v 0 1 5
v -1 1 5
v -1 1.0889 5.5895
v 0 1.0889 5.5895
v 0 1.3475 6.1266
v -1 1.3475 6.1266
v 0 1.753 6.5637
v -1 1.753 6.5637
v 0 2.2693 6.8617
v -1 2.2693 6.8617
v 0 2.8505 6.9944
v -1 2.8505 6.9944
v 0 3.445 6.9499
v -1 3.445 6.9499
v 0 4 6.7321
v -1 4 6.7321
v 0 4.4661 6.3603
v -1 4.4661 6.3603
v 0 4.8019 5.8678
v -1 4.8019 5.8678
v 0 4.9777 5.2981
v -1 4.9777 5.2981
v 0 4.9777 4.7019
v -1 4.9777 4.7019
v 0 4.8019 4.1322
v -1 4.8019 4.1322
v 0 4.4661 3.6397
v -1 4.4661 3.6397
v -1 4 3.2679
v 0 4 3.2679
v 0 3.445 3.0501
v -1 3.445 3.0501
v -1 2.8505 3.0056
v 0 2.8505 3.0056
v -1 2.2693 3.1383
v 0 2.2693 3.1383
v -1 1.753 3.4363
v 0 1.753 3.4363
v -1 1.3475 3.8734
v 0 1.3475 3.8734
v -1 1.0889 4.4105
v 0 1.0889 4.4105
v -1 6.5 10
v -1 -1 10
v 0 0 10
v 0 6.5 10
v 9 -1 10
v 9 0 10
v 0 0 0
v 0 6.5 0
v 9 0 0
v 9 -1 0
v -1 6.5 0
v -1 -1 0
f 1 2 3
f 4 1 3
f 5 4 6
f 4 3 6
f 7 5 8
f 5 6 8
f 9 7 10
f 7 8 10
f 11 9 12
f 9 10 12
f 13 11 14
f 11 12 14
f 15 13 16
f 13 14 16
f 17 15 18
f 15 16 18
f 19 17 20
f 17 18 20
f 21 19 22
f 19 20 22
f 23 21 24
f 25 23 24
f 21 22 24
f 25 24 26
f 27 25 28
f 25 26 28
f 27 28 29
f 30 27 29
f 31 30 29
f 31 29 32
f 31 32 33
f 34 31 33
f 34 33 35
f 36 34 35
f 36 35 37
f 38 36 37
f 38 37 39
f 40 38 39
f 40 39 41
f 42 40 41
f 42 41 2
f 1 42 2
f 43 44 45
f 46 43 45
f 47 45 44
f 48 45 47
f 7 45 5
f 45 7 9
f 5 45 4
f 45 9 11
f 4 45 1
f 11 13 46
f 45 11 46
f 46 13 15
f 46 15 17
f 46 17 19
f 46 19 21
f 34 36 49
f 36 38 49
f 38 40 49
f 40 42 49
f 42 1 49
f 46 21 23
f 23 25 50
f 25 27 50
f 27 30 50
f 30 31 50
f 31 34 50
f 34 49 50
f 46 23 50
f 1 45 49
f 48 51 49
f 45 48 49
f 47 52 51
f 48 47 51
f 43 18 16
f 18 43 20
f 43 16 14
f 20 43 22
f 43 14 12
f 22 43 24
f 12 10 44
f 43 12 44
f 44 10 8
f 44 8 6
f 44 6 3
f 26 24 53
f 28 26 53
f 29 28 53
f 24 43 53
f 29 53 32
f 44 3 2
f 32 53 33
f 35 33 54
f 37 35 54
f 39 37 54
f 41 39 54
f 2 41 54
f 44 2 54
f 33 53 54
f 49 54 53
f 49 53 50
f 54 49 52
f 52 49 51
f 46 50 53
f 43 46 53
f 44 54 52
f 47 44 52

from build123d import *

# Parameters (mm, degrees)
AUFSATZ_LINEAR_AUSTRAGEN1_DEPTH = 10
SKIZZE2_R                       = 2
SCHNITT_LINEAR_AUSTRAGEN1_DEPTH = 16.564382416


with BuildPart() as part:
    # Skizze1 → Aufsatz-Linear austragen1 (new body)
    with BuildSketch(Plane.XY):
        Polygon((0, 0), (0, 6.5), (-1, 6.5), (-1, -1), (9, -1), (9, 0), align=None)
    extrude(amount=AUFSATZ_LINEAR_AUSTRAGEN1_DEPTH)

    # Skizze2 → Schnitt-Linear austragen1 (cut, through all)
    with BuildSketch(Plane.ZY.offset(1)):
        with Locations((5, 3)):
            Circle(SKIZZE2_R)
    extrude(amount=-SCHNITT_LINEAR_AUSTRAGEN1_DEPTH, mode=Mode.SUBTRACT)


solid = part.part
